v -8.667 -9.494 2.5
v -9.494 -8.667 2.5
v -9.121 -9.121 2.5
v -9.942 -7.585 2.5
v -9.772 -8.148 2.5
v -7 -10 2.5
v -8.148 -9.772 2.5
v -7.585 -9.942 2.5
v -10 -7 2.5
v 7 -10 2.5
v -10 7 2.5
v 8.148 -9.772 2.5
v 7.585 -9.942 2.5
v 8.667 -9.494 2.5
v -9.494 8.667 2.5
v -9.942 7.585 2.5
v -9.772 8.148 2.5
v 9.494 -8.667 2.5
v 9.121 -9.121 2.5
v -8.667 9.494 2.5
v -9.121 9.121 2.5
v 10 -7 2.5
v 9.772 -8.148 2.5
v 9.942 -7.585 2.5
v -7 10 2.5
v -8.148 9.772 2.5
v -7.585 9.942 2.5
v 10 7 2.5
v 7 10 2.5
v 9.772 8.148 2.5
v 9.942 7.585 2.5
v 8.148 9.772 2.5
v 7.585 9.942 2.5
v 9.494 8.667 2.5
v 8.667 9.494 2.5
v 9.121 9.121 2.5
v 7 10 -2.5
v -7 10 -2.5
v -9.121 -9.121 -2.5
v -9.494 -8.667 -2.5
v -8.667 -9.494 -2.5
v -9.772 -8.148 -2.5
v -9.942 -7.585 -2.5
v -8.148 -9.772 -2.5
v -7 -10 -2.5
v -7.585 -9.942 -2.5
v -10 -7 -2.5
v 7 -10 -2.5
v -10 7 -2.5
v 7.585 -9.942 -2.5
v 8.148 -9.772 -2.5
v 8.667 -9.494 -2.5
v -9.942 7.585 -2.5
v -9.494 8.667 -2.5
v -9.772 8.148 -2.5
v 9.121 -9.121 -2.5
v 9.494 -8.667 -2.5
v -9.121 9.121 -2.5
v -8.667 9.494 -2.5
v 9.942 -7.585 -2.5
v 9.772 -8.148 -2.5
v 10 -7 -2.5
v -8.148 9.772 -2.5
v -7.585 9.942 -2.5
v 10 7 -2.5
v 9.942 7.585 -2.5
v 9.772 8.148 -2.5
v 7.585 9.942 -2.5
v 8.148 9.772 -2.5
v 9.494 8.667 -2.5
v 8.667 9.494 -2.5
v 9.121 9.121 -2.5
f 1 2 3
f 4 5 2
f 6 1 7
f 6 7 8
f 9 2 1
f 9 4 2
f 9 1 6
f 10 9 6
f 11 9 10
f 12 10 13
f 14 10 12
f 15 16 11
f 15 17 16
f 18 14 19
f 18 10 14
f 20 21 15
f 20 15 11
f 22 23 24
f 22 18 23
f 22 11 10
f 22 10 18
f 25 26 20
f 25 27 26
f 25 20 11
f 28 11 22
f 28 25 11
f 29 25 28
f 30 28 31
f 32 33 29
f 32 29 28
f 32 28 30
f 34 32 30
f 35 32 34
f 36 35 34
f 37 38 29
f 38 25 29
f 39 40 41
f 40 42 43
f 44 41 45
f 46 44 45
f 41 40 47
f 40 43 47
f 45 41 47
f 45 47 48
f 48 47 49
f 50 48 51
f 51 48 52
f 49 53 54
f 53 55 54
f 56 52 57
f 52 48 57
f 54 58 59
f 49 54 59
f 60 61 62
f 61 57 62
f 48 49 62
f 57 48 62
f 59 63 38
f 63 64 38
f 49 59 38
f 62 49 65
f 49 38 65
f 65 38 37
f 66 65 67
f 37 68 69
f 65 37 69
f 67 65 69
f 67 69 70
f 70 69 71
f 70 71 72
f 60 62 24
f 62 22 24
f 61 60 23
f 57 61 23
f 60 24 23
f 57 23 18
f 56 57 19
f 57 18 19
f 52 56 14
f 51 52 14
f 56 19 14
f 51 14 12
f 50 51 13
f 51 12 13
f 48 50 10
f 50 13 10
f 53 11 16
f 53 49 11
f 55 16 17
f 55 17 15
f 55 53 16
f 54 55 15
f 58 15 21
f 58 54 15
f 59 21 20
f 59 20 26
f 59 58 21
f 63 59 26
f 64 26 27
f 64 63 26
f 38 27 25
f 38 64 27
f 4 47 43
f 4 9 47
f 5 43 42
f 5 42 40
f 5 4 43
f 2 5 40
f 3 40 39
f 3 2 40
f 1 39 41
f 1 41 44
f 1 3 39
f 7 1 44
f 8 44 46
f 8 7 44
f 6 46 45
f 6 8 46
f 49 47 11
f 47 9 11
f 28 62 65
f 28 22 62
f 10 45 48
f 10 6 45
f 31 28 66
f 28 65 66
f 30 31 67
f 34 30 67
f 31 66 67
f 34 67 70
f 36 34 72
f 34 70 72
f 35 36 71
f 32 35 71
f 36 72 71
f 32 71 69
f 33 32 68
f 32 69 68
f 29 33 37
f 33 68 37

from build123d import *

# Parameters (mm, degrees)
SKETCH1_W           = 20
SKETCH1_H           = 20
BOSS_EXTRUDE1_DEPTH = 2.5
FILLET1_R           = 3


with BuildPart() as part:
    # Sketch1 → Boss-Extrude1 (new, symmetric)
    with BuildSketch(Plane.XY):
        Rectangle(SKETCH1_W, SKETCH1_H)
    extrude(amount=BOSS_EXTRUDE1_DEPTH, both=True)

    # Fillet1
    fillet1_edges = [part.edges().sort_by_distance(p)[0] for p in [
        (10, -10, 0),
        (-10, -10, 0),
        (-10, 10, 0),
        (10, 10, 0),
    ]]
    fillet(fillet1_edges, radius=FILLET1_R)


solid = part.part
